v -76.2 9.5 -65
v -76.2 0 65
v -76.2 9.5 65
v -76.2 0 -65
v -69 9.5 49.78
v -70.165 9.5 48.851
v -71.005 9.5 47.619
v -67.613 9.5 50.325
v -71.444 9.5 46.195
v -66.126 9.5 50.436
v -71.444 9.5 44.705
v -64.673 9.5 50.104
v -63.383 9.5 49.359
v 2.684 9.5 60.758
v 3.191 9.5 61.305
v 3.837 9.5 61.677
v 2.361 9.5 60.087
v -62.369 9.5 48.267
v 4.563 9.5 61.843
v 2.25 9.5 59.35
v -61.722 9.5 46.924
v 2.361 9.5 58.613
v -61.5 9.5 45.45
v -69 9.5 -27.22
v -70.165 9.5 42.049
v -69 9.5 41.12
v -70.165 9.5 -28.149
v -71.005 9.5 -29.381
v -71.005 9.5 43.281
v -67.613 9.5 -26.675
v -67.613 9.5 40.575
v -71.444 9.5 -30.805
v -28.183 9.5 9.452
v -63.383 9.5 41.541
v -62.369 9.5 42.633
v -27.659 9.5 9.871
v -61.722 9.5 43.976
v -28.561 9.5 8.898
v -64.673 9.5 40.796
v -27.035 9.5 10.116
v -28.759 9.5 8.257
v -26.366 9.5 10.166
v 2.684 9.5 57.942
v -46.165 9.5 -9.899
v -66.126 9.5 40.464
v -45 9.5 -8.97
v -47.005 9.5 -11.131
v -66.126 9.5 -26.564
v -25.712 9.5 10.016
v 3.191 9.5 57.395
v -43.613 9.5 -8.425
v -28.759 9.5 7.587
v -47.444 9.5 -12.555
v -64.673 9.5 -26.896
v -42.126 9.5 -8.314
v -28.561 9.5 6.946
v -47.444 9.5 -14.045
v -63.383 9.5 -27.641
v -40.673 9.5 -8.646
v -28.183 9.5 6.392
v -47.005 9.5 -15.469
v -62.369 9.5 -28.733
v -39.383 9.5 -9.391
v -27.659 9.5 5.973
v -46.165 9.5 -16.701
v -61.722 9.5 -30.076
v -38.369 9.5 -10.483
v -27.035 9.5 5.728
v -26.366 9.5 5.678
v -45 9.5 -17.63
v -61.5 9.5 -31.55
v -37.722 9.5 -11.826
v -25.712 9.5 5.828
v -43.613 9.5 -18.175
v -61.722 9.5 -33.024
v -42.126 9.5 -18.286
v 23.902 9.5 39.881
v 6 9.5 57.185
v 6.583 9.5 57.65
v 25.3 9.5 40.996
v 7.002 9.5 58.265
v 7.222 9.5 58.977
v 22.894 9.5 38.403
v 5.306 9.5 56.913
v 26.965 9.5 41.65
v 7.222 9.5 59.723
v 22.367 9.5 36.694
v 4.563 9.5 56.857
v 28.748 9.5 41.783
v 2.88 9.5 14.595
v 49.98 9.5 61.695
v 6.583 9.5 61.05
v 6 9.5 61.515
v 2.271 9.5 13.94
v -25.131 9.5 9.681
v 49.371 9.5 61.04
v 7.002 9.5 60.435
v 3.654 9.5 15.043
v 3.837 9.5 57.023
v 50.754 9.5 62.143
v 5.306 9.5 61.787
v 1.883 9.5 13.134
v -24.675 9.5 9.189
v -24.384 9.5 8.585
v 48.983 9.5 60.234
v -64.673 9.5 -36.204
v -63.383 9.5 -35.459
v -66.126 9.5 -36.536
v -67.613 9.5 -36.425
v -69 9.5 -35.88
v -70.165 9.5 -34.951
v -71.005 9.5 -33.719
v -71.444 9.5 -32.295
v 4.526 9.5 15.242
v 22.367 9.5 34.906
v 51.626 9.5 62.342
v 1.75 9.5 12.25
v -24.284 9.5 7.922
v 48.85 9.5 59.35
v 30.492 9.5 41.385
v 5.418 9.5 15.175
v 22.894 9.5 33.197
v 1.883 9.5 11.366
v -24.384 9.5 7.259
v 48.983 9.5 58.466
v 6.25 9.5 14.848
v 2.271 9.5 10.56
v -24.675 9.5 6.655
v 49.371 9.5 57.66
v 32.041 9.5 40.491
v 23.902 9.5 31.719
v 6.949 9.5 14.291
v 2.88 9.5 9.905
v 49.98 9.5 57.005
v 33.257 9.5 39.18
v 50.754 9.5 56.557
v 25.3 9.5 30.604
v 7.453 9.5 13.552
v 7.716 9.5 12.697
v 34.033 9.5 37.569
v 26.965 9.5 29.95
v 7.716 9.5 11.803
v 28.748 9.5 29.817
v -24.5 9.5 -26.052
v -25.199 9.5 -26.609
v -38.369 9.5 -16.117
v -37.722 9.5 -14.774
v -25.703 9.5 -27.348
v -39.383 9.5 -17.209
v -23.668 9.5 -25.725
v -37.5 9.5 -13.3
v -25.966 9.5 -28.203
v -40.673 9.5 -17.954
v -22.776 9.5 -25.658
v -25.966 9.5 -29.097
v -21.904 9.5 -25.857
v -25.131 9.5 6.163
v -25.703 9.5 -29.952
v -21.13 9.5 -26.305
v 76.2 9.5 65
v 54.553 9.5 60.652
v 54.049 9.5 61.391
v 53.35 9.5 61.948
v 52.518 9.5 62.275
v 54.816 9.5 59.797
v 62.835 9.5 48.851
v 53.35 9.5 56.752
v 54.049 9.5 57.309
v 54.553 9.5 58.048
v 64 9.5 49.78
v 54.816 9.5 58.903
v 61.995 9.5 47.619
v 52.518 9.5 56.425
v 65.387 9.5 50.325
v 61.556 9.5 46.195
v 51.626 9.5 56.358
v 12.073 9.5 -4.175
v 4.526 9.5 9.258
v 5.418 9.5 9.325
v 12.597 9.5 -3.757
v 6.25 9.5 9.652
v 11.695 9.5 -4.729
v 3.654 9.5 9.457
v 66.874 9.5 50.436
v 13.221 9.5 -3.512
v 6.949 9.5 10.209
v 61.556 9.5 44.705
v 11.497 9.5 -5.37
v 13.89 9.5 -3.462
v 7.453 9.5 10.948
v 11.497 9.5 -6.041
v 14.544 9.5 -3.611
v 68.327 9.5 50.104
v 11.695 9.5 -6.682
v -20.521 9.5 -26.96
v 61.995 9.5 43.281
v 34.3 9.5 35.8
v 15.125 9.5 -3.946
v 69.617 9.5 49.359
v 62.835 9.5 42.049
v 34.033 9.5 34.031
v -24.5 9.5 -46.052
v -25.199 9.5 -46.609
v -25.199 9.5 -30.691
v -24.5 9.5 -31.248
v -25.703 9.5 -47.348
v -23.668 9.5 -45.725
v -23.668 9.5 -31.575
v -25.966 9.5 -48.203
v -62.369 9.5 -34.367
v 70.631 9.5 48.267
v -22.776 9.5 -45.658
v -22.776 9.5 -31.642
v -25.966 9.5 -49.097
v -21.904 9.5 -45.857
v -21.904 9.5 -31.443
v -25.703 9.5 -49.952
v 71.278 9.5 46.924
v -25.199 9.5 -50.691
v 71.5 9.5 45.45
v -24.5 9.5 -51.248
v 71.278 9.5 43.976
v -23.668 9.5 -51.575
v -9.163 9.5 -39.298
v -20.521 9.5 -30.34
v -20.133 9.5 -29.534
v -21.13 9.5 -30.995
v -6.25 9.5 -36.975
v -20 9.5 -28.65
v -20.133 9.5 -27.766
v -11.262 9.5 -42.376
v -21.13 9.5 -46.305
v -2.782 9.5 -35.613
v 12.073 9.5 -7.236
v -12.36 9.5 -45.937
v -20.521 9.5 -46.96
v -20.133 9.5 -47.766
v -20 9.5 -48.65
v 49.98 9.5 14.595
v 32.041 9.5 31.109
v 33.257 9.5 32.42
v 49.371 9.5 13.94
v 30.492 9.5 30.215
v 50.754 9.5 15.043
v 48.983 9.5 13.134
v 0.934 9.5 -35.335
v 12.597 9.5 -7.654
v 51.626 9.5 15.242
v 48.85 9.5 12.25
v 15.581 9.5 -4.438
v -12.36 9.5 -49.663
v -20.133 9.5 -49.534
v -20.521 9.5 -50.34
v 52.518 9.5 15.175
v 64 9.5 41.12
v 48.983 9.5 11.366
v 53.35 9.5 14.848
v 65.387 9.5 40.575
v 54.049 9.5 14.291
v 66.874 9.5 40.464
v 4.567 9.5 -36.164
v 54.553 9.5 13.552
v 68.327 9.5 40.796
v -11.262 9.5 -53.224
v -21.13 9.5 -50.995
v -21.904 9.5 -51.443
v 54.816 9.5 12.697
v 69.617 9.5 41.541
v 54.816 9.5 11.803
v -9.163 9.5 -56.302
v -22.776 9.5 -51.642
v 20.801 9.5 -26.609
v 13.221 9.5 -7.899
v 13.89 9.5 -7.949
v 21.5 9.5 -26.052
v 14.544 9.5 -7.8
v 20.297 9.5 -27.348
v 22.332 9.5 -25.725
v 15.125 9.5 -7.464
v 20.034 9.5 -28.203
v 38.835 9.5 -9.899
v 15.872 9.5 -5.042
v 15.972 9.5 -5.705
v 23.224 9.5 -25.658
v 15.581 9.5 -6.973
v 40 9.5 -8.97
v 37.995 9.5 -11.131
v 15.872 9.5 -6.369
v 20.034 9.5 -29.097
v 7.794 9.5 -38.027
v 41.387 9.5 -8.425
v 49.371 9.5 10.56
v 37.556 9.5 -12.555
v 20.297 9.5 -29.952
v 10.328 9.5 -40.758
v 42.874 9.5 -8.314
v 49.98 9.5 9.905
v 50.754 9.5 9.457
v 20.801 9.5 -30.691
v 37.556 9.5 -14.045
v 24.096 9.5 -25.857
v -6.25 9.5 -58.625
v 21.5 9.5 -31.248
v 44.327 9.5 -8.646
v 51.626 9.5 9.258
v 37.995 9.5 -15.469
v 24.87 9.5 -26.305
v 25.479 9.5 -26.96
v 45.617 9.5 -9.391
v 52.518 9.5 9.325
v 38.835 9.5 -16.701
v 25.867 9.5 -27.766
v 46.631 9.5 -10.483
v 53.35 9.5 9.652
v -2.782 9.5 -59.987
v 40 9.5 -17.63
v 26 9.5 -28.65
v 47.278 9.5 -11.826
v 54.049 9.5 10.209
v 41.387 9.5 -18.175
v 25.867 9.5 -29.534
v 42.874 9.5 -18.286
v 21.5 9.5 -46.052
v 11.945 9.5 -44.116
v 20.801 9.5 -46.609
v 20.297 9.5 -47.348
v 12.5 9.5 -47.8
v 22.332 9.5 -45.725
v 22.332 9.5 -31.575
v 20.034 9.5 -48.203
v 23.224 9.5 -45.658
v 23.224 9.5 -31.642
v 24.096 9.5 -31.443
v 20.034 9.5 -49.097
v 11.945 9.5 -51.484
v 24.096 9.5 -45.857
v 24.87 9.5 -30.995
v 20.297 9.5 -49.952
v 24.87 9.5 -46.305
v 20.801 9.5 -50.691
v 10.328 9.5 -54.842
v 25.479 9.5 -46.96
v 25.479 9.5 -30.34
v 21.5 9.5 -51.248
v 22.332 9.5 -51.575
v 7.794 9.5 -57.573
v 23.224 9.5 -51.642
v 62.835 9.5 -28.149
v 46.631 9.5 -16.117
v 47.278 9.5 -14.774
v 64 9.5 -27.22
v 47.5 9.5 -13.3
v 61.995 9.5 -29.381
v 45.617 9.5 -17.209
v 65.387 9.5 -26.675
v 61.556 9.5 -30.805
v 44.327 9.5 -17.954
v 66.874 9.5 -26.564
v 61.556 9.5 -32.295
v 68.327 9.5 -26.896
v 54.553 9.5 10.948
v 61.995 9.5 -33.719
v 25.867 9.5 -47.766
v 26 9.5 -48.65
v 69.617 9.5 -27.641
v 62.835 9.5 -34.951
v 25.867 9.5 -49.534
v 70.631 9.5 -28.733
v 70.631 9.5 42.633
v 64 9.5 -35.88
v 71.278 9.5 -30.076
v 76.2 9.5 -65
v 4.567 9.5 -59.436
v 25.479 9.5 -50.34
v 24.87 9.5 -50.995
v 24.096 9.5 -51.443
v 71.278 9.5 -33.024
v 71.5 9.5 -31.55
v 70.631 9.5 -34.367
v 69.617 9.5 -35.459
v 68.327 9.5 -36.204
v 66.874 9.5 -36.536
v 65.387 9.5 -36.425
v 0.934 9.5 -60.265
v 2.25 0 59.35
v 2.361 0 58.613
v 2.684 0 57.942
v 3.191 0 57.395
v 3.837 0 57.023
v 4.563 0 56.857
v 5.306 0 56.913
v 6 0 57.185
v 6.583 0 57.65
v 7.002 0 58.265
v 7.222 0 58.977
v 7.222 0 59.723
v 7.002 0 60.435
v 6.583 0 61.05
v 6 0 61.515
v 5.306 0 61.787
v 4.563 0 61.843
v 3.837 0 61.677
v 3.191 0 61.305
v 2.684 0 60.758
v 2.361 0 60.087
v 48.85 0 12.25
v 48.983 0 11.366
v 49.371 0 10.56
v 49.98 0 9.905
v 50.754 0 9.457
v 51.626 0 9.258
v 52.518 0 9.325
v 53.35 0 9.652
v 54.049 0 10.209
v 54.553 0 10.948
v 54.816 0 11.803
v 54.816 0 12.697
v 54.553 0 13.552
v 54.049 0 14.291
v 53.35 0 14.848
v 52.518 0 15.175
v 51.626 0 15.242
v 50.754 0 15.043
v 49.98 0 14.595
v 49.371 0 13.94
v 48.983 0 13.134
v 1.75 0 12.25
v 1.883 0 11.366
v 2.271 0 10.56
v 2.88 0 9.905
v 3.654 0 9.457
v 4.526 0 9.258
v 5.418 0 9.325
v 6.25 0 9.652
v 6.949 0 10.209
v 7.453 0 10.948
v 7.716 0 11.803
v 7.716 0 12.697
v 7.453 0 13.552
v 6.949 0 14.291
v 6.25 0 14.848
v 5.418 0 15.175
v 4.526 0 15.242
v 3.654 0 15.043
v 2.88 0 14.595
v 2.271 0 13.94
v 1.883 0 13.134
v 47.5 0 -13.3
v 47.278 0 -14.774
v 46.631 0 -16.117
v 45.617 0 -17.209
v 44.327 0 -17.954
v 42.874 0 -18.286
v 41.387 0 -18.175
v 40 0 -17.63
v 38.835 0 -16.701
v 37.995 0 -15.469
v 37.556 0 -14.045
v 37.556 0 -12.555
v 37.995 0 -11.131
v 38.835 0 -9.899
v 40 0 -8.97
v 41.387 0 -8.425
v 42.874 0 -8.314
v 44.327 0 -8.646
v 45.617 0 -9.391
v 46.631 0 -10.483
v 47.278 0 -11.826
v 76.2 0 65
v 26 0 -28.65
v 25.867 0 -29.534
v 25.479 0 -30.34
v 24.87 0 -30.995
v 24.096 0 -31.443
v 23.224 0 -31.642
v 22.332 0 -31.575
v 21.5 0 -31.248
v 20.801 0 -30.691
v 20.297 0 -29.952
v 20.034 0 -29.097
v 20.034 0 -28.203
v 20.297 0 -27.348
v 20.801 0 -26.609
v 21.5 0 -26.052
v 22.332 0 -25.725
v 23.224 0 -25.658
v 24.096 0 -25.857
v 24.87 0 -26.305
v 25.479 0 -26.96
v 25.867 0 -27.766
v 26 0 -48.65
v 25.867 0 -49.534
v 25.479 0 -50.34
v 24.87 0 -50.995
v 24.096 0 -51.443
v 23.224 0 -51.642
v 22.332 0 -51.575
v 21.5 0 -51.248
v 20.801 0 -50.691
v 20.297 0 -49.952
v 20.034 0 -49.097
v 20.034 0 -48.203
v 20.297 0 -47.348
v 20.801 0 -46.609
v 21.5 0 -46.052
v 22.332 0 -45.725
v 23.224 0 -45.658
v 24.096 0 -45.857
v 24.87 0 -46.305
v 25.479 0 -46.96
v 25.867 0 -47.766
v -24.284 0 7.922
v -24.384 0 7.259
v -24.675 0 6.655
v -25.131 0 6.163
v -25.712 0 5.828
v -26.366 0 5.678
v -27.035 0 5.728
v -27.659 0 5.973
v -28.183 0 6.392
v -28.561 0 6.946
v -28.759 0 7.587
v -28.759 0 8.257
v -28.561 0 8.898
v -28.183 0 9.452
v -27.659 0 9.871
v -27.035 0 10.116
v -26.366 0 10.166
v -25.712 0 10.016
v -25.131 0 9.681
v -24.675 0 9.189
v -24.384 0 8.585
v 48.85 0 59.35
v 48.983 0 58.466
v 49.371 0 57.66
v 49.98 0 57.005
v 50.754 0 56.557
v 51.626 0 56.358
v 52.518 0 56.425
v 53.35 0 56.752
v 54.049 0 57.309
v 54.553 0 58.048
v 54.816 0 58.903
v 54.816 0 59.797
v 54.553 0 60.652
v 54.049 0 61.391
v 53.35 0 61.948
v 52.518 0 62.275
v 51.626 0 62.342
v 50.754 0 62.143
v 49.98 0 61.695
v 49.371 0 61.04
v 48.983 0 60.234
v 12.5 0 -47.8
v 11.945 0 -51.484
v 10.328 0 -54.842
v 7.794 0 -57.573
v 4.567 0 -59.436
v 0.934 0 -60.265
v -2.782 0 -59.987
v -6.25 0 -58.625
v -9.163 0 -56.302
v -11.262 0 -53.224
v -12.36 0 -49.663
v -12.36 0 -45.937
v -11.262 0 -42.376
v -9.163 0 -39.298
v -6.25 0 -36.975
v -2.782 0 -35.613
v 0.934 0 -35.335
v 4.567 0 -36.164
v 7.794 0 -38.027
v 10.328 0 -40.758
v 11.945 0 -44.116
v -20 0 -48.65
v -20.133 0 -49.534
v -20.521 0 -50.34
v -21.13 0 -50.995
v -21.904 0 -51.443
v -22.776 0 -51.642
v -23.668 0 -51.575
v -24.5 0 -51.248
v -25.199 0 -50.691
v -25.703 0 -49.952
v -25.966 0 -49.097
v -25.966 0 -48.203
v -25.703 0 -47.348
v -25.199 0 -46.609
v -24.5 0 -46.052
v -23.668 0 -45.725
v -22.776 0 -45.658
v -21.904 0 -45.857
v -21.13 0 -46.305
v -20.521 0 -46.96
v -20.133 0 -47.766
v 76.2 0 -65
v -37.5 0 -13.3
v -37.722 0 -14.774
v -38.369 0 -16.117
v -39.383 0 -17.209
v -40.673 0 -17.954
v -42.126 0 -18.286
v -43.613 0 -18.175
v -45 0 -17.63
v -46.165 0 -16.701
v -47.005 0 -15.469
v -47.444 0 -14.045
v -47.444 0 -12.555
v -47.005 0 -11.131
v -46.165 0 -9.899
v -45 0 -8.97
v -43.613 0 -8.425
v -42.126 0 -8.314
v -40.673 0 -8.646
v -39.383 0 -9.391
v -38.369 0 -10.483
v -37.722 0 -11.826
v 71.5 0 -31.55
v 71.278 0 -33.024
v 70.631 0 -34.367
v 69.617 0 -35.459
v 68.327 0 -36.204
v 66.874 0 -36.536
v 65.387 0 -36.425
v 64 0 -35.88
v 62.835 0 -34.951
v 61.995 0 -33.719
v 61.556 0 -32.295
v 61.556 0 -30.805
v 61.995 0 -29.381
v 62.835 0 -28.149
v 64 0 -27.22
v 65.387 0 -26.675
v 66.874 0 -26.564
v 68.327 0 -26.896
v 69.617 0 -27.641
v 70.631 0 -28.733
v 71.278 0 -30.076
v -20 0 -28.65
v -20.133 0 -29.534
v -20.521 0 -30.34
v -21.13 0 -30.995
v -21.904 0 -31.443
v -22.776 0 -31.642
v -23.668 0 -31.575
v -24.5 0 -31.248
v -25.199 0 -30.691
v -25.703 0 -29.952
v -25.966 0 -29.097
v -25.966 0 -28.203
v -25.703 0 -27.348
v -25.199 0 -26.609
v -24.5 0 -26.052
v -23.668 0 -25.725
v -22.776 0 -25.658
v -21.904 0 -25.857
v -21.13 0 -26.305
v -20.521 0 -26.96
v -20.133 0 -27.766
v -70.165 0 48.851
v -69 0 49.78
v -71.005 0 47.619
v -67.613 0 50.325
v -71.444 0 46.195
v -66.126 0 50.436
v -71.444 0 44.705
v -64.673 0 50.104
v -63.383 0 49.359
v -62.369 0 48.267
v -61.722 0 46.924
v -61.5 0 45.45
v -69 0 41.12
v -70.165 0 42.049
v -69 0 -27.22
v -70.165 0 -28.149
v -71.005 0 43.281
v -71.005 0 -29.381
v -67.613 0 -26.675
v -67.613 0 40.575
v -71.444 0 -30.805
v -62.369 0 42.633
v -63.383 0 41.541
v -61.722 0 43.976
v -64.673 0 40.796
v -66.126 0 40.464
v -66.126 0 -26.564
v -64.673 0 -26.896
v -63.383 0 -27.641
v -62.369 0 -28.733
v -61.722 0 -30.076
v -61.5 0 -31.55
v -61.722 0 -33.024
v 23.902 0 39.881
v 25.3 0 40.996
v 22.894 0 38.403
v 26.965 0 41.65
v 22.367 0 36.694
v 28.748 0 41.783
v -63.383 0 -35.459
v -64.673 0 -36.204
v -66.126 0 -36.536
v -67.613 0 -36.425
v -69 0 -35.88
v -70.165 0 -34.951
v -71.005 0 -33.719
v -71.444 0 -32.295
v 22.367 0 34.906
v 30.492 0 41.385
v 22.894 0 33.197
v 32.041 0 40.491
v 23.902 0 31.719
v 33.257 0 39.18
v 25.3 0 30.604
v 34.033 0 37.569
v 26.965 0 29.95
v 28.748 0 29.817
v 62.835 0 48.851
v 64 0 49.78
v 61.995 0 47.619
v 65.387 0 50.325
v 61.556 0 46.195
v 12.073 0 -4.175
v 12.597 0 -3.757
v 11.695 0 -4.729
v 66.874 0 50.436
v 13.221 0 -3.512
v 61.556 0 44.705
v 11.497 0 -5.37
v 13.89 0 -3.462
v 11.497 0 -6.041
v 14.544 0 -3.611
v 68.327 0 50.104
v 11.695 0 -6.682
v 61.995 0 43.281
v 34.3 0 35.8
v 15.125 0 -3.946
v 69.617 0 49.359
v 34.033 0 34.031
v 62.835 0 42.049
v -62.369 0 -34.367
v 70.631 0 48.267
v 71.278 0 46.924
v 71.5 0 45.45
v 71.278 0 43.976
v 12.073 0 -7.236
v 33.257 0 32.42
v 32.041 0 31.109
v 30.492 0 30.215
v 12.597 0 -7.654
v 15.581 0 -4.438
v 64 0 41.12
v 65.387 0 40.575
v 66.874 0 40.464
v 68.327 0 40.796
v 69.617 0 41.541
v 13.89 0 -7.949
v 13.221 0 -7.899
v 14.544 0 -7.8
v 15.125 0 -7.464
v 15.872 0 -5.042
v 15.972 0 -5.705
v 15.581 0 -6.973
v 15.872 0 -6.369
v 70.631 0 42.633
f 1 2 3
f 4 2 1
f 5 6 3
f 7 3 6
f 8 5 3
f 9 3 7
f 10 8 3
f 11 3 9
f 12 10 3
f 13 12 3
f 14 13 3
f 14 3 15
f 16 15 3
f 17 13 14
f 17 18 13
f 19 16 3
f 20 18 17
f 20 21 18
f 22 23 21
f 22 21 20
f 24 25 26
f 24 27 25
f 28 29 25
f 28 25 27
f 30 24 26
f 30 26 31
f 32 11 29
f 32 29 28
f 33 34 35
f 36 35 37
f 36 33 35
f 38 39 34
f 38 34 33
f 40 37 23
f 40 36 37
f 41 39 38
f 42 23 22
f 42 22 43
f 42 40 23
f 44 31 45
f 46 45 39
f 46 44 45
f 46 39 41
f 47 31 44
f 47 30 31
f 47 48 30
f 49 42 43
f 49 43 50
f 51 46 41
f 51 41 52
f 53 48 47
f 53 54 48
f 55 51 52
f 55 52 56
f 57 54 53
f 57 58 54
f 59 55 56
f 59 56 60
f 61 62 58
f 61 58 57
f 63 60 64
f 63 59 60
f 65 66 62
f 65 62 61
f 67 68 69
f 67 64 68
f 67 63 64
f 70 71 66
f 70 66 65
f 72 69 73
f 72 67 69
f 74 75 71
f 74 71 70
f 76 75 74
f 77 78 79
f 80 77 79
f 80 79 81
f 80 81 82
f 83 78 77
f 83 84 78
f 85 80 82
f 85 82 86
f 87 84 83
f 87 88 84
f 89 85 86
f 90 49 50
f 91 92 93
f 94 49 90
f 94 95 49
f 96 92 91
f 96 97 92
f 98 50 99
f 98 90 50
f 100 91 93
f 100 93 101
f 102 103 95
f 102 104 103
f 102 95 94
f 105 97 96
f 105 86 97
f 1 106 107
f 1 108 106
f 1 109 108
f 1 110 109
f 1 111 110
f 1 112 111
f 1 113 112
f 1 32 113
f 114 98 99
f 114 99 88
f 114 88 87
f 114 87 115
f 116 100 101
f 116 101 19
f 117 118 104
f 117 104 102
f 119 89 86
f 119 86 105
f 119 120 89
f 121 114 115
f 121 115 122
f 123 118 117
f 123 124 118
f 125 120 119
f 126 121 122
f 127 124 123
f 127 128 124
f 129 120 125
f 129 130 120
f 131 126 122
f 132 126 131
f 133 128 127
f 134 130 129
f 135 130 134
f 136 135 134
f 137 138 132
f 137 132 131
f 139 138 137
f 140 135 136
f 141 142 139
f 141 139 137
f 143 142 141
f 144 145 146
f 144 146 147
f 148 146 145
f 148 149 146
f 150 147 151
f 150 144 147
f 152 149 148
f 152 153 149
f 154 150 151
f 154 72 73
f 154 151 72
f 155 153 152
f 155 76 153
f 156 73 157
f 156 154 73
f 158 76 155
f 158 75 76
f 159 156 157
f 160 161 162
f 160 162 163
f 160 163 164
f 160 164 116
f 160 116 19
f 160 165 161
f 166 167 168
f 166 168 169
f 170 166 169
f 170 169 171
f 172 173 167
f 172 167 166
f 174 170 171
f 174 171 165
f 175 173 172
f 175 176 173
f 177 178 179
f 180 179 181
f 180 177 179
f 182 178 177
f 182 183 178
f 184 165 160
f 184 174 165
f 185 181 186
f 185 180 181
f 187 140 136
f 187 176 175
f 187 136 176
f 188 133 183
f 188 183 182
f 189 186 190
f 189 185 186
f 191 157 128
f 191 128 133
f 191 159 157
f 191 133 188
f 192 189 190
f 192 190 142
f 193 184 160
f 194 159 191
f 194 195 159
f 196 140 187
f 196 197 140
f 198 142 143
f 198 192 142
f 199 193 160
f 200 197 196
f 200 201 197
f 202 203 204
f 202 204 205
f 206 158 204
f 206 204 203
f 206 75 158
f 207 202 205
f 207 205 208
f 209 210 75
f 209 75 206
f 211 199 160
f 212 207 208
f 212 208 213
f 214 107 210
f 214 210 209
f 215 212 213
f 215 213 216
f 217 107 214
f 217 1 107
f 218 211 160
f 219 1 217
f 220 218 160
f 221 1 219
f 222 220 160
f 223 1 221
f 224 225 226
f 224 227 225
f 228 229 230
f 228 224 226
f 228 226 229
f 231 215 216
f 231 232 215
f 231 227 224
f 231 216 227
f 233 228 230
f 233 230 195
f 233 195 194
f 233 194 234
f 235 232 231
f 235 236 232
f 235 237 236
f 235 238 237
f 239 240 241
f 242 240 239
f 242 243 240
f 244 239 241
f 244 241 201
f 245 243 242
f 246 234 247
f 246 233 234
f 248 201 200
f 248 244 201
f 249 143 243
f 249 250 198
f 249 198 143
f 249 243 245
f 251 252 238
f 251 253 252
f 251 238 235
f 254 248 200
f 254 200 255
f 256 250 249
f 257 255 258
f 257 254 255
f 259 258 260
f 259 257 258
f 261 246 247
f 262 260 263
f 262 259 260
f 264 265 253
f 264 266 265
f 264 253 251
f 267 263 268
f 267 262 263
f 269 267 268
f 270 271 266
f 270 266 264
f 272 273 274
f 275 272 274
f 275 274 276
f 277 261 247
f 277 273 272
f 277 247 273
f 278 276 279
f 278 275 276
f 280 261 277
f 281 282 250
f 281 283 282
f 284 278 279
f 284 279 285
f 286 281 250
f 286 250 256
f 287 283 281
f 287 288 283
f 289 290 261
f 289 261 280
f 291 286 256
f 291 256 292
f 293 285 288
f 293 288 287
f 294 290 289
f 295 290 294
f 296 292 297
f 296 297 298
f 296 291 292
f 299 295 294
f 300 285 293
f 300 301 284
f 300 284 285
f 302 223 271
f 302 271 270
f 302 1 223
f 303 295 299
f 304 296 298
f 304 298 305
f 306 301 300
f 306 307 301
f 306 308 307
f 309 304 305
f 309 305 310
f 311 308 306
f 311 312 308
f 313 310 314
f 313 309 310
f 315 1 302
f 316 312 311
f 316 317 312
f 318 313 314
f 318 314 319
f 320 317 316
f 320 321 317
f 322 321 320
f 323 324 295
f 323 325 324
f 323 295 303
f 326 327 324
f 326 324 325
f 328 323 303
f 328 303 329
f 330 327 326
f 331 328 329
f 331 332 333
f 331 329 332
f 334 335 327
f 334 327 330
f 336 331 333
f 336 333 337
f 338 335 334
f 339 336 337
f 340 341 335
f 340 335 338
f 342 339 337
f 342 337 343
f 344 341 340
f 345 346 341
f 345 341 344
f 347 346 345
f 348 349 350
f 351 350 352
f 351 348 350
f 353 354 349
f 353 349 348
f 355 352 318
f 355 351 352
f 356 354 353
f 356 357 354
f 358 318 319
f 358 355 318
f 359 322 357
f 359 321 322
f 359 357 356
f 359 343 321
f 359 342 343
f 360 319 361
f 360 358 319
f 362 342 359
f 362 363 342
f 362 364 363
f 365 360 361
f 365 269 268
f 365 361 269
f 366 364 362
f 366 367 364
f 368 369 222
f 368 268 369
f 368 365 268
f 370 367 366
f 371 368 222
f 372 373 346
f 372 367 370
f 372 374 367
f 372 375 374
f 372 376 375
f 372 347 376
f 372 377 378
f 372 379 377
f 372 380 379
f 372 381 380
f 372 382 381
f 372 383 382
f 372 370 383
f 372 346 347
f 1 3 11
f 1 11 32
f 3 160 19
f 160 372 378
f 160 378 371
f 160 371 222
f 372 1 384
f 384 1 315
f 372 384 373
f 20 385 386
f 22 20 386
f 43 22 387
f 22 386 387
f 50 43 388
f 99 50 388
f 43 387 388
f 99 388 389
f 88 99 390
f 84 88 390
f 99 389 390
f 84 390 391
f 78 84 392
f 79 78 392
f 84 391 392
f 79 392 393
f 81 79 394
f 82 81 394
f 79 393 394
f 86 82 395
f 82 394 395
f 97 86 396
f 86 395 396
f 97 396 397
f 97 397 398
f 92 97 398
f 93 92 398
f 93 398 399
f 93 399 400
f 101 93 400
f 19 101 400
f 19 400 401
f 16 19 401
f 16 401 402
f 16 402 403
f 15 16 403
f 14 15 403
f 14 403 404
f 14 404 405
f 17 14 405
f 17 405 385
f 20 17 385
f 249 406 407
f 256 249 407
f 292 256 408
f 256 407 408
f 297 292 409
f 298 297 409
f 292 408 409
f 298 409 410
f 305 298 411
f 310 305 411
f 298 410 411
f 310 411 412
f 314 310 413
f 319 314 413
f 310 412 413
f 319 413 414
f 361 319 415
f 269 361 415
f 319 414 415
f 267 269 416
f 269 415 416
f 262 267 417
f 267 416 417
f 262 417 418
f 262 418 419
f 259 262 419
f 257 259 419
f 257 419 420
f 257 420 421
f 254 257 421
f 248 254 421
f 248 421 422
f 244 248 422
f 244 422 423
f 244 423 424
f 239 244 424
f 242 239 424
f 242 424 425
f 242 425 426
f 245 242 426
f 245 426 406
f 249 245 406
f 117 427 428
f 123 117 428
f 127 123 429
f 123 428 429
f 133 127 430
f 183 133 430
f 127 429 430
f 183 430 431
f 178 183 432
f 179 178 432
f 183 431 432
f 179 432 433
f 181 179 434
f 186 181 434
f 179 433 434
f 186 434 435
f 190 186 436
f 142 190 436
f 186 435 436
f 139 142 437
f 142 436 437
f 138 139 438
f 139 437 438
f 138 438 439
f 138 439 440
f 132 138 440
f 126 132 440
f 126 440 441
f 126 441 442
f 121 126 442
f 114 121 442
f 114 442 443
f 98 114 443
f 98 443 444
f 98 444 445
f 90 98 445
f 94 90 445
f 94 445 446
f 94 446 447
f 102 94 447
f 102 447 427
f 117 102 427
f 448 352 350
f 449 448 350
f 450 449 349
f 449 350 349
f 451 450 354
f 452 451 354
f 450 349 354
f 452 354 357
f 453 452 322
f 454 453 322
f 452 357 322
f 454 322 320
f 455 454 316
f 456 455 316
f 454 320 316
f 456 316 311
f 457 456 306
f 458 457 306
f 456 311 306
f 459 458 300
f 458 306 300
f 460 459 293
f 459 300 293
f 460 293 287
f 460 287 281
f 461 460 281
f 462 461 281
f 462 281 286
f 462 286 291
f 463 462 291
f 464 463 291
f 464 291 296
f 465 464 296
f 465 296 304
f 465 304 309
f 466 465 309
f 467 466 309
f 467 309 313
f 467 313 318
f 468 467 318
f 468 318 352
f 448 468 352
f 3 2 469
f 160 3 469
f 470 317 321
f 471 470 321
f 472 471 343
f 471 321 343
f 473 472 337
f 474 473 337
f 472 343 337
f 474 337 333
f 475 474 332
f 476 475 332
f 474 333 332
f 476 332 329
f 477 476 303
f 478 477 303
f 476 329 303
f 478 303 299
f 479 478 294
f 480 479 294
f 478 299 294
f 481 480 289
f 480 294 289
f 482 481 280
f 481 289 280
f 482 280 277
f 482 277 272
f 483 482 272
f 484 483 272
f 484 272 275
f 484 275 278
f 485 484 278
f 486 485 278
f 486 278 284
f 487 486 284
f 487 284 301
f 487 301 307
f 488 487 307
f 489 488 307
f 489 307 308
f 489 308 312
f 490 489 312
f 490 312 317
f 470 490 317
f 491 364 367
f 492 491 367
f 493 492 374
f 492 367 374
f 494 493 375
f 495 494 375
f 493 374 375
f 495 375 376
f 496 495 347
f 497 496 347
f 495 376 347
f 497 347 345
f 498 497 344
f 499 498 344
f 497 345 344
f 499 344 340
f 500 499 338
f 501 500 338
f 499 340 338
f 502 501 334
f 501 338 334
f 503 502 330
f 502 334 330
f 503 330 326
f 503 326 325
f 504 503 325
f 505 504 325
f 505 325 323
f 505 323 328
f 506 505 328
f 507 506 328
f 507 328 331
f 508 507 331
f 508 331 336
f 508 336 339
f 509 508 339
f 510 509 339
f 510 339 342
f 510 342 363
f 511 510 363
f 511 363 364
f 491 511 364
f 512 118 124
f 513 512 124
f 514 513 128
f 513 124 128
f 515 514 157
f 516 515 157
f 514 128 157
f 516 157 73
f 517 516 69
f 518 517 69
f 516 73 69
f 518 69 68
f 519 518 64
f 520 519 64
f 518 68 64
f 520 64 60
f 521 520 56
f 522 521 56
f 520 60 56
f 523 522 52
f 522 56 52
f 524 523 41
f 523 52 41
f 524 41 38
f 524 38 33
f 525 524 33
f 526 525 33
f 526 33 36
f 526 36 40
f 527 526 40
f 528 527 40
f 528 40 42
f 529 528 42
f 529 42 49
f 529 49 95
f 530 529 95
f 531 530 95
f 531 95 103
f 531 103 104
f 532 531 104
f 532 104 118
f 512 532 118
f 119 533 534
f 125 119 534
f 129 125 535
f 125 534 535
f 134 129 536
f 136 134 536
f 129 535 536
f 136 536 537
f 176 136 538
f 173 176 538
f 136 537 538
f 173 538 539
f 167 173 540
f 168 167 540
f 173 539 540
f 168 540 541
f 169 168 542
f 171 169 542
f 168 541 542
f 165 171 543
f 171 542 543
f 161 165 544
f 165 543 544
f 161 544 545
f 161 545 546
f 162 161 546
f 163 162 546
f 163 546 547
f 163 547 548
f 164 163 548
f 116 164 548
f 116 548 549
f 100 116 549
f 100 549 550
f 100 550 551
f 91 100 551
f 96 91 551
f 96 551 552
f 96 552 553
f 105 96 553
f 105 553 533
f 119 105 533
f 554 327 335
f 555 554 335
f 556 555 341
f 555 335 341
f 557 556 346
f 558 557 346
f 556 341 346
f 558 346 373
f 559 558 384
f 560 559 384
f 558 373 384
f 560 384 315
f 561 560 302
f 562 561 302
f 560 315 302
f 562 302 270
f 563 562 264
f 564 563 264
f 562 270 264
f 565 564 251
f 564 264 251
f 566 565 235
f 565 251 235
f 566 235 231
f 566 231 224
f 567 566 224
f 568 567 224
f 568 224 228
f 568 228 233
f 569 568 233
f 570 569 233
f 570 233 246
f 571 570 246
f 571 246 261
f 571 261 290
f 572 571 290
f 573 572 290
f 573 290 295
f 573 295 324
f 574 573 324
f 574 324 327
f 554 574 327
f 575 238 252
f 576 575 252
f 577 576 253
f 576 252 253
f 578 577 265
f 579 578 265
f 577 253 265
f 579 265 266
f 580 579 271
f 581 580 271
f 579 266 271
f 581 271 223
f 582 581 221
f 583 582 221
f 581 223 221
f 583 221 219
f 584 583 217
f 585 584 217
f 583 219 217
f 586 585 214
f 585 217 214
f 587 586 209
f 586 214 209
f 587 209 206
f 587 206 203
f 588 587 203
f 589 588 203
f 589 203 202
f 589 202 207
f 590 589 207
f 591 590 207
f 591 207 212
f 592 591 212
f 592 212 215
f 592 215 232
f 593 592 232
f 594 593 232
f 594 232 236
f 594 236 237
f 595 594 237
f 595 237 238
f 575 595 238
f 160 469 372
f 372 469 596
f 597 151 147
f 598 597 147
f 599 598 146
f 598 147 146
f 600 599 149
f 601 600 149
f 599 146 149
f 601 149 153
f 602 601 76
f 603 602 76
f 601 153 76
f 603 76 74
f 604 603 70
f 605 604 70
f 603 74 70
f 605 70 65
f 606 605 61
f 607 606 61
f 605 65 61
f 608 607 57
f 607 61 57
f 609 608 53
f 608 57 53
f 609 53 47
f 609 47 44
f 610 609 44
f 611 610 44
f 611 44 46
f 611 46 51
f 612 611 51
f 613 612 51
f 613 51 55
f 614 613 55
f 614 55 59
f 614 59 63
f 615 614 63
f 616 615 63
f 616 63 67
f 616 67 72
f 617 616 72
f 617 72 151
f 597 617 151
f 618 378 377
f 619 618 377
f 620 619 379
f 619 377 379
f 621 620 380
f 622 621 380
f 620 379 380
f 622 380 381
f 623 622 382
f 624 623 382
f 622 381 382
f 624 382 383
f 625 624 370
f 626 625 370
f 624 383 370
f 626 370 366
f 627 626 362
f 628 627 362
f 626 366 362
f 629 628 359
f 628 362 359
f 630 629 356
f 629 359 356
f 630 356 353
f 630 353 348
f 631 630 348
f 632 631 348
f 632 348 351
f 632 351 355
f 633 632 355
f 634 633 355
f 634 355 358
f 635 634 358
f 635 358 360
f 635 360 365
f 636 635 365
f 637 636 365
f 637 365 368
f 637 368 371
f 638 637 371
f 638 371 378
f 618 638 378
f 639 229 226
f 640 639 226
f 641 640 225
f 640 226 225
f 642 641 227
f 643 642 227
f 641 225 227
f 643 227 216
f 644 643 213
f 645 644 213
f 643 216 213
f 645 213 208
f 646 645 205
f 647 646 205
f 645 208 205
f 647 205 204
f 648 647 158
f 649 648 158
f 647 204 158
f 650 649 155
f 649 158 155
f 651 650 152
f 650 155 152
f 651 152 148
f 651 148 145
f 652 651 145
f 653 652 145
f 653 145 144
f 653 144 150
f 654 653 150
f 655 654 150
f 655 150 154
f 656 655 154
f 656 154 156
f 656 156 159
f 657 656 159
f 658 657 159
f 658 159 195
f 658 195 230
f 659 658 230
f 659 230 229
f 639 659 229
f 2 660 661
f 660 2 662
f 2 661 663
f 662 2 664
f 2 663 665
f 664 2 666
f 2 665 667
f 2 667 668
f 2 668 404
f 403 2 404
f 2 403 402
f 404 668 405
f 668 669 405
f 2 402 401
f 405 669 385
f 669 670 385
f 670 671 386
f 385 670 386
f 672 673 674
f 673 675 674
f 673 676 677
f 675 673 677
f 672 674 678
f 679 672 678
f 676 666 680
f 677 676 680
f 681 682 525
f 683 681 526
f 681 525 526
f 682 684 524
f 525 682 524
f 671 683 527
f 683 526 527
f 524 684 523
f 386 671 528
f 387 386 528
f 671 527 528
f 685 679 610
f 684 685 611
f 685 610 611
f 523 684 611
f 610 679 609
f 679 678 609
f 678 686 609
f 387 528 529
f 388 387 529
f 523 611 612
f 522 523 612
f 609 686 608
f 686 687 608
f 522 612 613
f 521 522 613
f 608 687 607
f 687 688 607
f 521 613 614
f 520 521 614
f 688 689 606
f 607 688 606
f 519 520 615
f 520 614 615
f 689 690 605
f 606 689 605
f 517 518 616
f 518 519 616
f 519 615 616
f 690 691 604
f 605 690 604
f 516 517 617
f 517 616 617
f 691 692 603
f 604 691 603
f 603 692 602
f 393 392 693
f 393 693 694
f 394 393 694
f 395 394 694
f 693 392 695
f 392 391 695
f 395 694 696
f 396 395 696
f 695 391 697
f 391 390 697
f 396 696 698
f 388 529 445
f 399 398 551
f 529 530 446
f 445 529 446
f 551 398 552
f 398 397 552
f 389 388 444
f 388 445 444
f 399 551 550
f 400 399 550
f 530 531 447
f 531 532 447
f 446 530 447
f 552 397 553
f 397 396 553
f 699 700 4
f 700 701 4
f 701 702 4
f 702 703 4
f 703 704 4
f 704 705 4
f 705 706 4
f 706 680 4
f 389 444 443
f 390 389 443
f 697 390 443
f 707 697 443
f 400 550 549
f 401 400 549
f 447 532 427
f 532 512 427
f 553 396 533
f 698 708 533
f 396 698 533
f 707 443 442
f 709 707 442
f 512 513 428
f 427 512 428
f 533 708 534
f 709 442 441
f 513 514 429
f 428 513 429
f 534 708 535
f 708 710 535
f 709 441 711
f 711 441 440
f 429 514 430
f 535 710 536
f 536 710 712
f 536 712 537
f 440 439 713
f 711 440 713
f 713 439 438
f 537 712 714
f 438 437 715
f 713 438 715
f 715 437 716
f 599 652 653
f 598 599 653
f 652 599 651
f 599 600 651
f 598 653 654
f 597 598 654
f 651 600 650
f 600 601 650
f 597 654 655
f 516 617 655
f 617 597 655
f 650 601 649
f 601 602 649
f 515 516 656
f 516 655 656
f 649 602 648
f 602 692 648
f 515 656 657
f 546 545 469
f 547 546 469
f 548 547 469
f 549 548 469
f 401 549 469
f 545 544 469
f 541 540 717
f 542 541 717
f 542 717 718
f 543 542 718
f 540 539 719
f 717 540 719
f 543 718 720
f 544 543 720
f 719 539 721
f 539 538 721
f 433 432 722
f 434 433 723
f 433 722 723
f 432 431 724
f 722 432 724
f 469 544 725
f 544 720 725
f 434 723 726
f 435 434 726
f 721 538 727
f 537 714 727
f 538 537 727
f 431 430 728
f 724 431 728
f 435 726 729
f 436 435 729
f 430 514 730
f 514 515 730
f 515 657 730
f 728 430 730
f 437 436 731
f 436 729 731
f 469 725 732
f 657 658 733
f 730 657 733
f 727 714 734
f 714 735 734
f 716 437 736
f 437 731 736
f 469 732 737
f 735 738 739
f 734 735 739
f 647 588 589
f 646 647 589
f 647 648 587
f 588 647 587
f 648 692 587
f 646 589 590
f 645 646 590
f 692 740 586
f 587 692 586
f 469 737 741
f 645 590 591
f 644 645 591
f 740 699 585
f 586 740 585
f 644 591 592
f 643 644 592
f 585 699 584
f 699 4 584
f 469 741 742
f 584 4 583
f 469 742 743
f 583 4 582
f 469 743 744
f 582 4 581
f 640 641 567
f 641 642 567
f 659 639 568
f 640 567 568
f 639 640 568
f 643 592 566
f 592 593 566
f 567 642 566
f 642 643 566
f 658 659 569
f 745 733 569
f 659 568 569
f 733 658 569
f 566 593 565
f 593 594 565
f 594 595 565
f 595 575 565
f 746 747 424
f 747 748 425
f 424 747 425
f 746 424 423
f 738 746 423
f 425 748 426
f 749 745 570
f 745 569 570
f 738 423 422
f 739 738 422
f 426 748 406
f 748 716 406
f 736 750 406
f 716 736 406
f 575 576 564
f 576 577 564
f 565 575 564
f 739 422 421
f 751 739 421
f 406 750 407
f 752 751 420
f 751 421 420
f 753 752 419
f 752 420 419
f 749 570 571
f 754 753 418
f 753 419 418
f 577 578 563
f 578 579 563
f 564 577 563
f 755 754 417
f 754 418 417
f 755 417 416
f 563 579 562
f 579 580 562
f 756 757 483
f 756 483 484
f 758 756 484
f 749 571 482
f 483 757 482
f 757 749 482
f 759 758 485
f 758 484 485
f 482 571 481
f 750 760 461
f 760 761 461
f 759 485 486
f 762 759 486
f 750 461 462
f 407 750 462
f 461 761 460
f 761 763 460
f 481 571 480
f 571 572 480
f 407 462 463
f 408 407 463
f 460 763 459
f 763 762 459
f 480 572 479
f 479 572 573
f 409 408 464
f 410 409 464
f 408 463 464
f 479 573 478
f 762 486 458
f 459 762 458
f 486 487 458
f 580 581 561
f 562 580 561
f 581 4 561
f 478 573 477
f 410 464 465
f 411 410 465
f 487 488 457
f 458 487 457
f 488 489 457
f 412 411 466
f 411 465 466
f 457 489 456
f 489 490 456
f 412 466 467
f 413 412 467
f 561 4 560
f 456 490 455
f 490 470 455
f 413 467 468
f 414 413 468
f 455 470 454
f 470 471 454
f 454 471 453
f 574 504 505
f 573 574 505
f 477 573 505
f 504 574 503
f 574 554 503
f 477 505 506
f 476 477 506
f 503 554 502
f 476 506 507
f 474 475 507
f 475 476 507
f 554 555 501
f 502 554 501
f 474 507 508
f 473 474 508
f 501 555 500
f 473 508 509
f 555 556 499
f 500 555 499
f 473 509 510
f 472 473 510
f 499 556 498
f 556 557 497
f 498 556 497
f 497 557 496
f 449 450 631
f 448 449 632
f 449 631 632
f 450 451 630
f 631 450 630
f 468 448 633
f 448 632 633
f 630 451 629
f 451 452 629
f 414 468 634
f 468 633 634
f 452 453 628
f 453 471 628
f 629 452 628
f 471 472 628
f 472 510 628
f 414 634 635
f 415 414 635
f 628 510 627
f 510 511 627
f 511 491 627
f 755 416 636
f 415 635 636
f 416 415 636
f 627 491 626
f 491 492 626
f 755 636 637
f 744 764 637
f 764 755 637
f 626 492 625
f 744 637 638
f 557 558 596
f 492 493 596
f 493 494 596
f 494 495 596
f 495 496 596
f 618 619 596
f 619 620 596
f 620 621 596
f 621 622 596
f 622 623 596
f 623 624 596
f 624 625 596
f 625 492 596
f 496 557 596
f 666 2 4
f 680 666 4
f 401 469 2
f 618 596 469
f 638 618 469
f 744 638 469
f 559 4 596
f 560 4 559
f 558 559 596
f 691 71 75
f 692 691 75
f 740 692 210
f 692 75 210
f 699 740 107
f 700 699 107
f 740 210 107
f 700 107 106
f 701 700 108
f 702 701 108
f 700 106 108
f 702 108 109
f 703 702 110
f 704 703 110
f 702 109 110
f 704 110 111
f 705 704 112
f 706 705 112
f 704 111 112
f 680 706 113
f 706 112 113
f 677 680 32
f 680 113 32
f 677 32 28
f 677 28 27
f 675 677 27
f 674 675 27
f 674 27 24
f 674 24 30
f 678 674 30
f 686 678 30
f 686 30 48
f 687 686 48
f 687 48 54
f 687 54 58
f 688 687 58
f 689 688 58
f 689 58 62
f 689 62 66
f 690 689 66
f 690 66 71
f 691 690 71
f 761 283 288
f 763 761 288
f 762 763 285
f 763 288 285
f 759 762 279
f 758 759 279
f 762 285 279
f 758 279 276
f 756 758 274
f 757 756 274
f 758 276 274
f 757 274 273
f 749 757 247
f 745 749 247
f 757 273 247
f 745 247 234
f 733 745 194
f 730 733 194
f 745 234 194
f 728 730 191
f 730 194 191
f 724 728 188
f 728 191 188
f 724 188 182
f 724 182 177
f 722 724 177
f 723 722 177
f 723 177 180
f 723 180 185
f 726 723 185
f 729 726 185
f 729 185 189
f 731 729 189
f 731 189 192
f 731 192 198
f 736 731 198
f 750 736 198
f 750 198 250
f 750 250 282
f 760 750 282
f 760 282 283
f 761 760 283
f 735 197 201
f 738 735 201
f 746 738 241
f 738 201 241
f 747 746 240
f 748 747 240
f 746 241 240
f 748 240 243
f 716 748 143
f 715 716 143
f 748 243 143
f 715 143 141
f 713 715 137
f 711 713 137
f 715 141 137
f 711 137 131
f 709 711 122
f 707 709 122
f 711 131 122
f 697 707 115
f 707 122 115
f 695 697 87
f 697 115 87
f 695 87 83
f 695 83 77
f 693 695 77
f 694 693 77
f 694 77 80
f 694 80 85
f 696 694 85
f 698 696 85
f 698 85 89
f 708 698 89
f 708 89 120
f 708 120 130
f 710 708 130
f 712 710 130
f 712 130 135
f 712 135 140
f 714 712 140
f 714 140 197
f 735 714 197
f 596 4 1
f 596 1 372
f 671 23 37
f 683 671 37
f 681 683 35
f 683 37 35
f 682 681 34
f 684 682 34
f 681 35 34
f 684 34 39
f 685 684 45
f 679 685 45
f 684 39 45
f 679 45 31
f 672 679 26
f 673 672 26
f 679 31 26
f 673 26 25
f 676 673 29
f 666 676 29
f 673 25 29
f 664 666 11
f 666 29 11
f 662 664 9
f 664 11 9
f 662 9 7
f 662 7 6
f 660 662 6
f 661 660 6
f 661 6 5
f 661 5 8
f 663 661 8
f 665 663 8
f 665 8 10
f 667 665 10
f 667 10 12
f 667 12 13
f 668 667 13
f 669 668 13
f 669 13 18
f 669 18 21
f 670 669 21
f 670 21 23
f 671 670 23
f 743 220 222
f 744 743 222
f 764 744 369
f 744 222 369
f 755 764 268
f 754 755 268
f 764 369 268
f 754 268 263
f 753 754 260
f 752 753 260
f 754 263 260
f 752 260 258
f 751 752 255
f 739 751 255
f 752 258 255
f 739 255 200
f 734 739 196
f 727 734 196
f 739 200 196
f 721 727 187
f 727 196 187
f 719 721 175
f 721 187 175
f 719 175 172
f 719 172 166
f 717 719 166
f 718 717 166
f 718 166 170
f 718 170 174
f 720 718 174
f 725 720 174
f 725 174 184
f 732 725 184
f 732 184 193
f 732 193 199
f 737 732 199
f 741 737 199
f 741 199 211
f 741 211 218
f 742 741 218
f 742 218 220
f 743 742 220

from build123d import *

# Parameters (mm, degrees)
SKETCH1_W           = 152.4
SKETCH1_H           = 130
BOSS_EXTRUDE1_DEPTH = 9.5
SKETCH2_R           = 2.5
SKETCH2_R_2         = 3
CUT_EXTRUDE1_DEPTH  = 10
SKETCH3_R           = 6
CUT_EXTRUDE2_DEPTH  = 10
SKETCH4_R           = 2.25
SKETCH4_R_2         = 12.5
CUT_EXTRUDE3_DEPTH  = 10.5
SKETCH5_R           = 3
CUT_EXTRUDE4_DEPTH  = 10.5
SKETCH6_R           = 5
CUT_EXTRUDE5_DEPTH  = 10.5


with BuildPart() as part:
    # Sketch1 → Boss-Extrude1 (new body)
    with BuildSketch(Plane(origin=(0, 0, 0), x_dir=(1, 0, 0), z_dir=(0, 1, 0))):
        Rectangle(SKETCH1_W, SKETCH1_H)
    extrude(amount=BOSS_EXTRUDE1_DEPTH)

    # Sketch2 → Cut-Extrude1 (cut)
    with BuildSketch(Plane(origin=(0, 0, 0), x_dir=(-1, 0, 0), z_dir=(0, -1, 0))):
        with Locations((-4.75, -59.35)):
            Circle(SKETCH2_R)
        with Locations((-51.85, -59.35)):
            Circle(SKETCH2_R_2)
        with Locations((-4.75, -12.25)):
            Circle(SKETCH2_R_2)
        with Locations((-51.85, -12.25)):
            Circle(SKETCH2_R_2)
    extrude(amount=-CUT_EXTRUDE1_DEPTH, mode=Mode.SUBTRACT)

    # Sketch3 → Cut-Extrude2 (cut)
    with BuildSketch(Plane(origin=(0, 9.5, 0), x_dir=(1, 0, 0), z_dir=(0, 1, 0))):
        with Locations((28.3, -35.8)):
            Circle(SKETCH3_R)
    extrude(amount=-CUT_EXTRUDE2_DEPTH, mode=Mode.SUBTRACT)

    # Sketch4 → Cut-Extrude3 (cut, through all)
    with BuildSketch(Plane(origin=(0, 9.5, 0), x_dir=(1, 0, 0), z_dir=(0, 1, 0))):
        with Locations((-26.534128982, -7.921988471)):
            Circle(SKETCH4_R)
        with Locations((13.721874775, 5.705342944)):
            Circle(SKETCH4_R)
        with Locations((0, 47.8)):
            Circle(SKETCH4_R_2)
    extrude(amount=-CUT_EXTRUDE3_DEPTH, mode=Mode.SUBTRACT)

    # Sketch5 → Cut-Extrude4 (cut, through all)
    with BuildSketch(Plane(origin=(0, 9.5, 0), x_dir=(1, 0, 0), z_dir=(0, 1, 0))):
        with Locations((23, 28.65)):
            Circle(SKETCH5_R)
        with Locations((-23, 28.65)):
            Circle(SKETCH5_R)
        with Locations((23, 48.65)):
            Circle(SKETCH5_R)
        with Locations((-23, 48.65)):
            Circle(SKETCH5_R)
    extrude(amount=-CUT_EXTRUDE4_DEPTH, mode=Mode.SUBTRACT)

    # Sketch6 → Cut-Extrude5 (cut, through all)
    with BuildSketch(Plane(origin=(0, 9.5, 0), x_dir=(1, 0, 0), z_dir=(0, 1, 0))):
        with Locations((-66.5, 31.55)):
            Circle(SKETCH6_R)
        with Locations((-66.5, -45.45)):
            Circle(SKETCH6_R)
        with Locations((66.5, -45.45)):
            Circle(SKETCH6_R)
        with Locations((66.5, 31.55)):
            Circle(SKETCH6_R)
        with Locations((-42.5, 13.3)):
            Circle(SKETCH6_R)
        with Locations((42.5, 13.3)):
            Circle(SKETCH6_R)
    extrude(amount=-CUT_EXTRUDE5_DEPTH, mode=Mode.SUBTRACT)


solid = part.part
